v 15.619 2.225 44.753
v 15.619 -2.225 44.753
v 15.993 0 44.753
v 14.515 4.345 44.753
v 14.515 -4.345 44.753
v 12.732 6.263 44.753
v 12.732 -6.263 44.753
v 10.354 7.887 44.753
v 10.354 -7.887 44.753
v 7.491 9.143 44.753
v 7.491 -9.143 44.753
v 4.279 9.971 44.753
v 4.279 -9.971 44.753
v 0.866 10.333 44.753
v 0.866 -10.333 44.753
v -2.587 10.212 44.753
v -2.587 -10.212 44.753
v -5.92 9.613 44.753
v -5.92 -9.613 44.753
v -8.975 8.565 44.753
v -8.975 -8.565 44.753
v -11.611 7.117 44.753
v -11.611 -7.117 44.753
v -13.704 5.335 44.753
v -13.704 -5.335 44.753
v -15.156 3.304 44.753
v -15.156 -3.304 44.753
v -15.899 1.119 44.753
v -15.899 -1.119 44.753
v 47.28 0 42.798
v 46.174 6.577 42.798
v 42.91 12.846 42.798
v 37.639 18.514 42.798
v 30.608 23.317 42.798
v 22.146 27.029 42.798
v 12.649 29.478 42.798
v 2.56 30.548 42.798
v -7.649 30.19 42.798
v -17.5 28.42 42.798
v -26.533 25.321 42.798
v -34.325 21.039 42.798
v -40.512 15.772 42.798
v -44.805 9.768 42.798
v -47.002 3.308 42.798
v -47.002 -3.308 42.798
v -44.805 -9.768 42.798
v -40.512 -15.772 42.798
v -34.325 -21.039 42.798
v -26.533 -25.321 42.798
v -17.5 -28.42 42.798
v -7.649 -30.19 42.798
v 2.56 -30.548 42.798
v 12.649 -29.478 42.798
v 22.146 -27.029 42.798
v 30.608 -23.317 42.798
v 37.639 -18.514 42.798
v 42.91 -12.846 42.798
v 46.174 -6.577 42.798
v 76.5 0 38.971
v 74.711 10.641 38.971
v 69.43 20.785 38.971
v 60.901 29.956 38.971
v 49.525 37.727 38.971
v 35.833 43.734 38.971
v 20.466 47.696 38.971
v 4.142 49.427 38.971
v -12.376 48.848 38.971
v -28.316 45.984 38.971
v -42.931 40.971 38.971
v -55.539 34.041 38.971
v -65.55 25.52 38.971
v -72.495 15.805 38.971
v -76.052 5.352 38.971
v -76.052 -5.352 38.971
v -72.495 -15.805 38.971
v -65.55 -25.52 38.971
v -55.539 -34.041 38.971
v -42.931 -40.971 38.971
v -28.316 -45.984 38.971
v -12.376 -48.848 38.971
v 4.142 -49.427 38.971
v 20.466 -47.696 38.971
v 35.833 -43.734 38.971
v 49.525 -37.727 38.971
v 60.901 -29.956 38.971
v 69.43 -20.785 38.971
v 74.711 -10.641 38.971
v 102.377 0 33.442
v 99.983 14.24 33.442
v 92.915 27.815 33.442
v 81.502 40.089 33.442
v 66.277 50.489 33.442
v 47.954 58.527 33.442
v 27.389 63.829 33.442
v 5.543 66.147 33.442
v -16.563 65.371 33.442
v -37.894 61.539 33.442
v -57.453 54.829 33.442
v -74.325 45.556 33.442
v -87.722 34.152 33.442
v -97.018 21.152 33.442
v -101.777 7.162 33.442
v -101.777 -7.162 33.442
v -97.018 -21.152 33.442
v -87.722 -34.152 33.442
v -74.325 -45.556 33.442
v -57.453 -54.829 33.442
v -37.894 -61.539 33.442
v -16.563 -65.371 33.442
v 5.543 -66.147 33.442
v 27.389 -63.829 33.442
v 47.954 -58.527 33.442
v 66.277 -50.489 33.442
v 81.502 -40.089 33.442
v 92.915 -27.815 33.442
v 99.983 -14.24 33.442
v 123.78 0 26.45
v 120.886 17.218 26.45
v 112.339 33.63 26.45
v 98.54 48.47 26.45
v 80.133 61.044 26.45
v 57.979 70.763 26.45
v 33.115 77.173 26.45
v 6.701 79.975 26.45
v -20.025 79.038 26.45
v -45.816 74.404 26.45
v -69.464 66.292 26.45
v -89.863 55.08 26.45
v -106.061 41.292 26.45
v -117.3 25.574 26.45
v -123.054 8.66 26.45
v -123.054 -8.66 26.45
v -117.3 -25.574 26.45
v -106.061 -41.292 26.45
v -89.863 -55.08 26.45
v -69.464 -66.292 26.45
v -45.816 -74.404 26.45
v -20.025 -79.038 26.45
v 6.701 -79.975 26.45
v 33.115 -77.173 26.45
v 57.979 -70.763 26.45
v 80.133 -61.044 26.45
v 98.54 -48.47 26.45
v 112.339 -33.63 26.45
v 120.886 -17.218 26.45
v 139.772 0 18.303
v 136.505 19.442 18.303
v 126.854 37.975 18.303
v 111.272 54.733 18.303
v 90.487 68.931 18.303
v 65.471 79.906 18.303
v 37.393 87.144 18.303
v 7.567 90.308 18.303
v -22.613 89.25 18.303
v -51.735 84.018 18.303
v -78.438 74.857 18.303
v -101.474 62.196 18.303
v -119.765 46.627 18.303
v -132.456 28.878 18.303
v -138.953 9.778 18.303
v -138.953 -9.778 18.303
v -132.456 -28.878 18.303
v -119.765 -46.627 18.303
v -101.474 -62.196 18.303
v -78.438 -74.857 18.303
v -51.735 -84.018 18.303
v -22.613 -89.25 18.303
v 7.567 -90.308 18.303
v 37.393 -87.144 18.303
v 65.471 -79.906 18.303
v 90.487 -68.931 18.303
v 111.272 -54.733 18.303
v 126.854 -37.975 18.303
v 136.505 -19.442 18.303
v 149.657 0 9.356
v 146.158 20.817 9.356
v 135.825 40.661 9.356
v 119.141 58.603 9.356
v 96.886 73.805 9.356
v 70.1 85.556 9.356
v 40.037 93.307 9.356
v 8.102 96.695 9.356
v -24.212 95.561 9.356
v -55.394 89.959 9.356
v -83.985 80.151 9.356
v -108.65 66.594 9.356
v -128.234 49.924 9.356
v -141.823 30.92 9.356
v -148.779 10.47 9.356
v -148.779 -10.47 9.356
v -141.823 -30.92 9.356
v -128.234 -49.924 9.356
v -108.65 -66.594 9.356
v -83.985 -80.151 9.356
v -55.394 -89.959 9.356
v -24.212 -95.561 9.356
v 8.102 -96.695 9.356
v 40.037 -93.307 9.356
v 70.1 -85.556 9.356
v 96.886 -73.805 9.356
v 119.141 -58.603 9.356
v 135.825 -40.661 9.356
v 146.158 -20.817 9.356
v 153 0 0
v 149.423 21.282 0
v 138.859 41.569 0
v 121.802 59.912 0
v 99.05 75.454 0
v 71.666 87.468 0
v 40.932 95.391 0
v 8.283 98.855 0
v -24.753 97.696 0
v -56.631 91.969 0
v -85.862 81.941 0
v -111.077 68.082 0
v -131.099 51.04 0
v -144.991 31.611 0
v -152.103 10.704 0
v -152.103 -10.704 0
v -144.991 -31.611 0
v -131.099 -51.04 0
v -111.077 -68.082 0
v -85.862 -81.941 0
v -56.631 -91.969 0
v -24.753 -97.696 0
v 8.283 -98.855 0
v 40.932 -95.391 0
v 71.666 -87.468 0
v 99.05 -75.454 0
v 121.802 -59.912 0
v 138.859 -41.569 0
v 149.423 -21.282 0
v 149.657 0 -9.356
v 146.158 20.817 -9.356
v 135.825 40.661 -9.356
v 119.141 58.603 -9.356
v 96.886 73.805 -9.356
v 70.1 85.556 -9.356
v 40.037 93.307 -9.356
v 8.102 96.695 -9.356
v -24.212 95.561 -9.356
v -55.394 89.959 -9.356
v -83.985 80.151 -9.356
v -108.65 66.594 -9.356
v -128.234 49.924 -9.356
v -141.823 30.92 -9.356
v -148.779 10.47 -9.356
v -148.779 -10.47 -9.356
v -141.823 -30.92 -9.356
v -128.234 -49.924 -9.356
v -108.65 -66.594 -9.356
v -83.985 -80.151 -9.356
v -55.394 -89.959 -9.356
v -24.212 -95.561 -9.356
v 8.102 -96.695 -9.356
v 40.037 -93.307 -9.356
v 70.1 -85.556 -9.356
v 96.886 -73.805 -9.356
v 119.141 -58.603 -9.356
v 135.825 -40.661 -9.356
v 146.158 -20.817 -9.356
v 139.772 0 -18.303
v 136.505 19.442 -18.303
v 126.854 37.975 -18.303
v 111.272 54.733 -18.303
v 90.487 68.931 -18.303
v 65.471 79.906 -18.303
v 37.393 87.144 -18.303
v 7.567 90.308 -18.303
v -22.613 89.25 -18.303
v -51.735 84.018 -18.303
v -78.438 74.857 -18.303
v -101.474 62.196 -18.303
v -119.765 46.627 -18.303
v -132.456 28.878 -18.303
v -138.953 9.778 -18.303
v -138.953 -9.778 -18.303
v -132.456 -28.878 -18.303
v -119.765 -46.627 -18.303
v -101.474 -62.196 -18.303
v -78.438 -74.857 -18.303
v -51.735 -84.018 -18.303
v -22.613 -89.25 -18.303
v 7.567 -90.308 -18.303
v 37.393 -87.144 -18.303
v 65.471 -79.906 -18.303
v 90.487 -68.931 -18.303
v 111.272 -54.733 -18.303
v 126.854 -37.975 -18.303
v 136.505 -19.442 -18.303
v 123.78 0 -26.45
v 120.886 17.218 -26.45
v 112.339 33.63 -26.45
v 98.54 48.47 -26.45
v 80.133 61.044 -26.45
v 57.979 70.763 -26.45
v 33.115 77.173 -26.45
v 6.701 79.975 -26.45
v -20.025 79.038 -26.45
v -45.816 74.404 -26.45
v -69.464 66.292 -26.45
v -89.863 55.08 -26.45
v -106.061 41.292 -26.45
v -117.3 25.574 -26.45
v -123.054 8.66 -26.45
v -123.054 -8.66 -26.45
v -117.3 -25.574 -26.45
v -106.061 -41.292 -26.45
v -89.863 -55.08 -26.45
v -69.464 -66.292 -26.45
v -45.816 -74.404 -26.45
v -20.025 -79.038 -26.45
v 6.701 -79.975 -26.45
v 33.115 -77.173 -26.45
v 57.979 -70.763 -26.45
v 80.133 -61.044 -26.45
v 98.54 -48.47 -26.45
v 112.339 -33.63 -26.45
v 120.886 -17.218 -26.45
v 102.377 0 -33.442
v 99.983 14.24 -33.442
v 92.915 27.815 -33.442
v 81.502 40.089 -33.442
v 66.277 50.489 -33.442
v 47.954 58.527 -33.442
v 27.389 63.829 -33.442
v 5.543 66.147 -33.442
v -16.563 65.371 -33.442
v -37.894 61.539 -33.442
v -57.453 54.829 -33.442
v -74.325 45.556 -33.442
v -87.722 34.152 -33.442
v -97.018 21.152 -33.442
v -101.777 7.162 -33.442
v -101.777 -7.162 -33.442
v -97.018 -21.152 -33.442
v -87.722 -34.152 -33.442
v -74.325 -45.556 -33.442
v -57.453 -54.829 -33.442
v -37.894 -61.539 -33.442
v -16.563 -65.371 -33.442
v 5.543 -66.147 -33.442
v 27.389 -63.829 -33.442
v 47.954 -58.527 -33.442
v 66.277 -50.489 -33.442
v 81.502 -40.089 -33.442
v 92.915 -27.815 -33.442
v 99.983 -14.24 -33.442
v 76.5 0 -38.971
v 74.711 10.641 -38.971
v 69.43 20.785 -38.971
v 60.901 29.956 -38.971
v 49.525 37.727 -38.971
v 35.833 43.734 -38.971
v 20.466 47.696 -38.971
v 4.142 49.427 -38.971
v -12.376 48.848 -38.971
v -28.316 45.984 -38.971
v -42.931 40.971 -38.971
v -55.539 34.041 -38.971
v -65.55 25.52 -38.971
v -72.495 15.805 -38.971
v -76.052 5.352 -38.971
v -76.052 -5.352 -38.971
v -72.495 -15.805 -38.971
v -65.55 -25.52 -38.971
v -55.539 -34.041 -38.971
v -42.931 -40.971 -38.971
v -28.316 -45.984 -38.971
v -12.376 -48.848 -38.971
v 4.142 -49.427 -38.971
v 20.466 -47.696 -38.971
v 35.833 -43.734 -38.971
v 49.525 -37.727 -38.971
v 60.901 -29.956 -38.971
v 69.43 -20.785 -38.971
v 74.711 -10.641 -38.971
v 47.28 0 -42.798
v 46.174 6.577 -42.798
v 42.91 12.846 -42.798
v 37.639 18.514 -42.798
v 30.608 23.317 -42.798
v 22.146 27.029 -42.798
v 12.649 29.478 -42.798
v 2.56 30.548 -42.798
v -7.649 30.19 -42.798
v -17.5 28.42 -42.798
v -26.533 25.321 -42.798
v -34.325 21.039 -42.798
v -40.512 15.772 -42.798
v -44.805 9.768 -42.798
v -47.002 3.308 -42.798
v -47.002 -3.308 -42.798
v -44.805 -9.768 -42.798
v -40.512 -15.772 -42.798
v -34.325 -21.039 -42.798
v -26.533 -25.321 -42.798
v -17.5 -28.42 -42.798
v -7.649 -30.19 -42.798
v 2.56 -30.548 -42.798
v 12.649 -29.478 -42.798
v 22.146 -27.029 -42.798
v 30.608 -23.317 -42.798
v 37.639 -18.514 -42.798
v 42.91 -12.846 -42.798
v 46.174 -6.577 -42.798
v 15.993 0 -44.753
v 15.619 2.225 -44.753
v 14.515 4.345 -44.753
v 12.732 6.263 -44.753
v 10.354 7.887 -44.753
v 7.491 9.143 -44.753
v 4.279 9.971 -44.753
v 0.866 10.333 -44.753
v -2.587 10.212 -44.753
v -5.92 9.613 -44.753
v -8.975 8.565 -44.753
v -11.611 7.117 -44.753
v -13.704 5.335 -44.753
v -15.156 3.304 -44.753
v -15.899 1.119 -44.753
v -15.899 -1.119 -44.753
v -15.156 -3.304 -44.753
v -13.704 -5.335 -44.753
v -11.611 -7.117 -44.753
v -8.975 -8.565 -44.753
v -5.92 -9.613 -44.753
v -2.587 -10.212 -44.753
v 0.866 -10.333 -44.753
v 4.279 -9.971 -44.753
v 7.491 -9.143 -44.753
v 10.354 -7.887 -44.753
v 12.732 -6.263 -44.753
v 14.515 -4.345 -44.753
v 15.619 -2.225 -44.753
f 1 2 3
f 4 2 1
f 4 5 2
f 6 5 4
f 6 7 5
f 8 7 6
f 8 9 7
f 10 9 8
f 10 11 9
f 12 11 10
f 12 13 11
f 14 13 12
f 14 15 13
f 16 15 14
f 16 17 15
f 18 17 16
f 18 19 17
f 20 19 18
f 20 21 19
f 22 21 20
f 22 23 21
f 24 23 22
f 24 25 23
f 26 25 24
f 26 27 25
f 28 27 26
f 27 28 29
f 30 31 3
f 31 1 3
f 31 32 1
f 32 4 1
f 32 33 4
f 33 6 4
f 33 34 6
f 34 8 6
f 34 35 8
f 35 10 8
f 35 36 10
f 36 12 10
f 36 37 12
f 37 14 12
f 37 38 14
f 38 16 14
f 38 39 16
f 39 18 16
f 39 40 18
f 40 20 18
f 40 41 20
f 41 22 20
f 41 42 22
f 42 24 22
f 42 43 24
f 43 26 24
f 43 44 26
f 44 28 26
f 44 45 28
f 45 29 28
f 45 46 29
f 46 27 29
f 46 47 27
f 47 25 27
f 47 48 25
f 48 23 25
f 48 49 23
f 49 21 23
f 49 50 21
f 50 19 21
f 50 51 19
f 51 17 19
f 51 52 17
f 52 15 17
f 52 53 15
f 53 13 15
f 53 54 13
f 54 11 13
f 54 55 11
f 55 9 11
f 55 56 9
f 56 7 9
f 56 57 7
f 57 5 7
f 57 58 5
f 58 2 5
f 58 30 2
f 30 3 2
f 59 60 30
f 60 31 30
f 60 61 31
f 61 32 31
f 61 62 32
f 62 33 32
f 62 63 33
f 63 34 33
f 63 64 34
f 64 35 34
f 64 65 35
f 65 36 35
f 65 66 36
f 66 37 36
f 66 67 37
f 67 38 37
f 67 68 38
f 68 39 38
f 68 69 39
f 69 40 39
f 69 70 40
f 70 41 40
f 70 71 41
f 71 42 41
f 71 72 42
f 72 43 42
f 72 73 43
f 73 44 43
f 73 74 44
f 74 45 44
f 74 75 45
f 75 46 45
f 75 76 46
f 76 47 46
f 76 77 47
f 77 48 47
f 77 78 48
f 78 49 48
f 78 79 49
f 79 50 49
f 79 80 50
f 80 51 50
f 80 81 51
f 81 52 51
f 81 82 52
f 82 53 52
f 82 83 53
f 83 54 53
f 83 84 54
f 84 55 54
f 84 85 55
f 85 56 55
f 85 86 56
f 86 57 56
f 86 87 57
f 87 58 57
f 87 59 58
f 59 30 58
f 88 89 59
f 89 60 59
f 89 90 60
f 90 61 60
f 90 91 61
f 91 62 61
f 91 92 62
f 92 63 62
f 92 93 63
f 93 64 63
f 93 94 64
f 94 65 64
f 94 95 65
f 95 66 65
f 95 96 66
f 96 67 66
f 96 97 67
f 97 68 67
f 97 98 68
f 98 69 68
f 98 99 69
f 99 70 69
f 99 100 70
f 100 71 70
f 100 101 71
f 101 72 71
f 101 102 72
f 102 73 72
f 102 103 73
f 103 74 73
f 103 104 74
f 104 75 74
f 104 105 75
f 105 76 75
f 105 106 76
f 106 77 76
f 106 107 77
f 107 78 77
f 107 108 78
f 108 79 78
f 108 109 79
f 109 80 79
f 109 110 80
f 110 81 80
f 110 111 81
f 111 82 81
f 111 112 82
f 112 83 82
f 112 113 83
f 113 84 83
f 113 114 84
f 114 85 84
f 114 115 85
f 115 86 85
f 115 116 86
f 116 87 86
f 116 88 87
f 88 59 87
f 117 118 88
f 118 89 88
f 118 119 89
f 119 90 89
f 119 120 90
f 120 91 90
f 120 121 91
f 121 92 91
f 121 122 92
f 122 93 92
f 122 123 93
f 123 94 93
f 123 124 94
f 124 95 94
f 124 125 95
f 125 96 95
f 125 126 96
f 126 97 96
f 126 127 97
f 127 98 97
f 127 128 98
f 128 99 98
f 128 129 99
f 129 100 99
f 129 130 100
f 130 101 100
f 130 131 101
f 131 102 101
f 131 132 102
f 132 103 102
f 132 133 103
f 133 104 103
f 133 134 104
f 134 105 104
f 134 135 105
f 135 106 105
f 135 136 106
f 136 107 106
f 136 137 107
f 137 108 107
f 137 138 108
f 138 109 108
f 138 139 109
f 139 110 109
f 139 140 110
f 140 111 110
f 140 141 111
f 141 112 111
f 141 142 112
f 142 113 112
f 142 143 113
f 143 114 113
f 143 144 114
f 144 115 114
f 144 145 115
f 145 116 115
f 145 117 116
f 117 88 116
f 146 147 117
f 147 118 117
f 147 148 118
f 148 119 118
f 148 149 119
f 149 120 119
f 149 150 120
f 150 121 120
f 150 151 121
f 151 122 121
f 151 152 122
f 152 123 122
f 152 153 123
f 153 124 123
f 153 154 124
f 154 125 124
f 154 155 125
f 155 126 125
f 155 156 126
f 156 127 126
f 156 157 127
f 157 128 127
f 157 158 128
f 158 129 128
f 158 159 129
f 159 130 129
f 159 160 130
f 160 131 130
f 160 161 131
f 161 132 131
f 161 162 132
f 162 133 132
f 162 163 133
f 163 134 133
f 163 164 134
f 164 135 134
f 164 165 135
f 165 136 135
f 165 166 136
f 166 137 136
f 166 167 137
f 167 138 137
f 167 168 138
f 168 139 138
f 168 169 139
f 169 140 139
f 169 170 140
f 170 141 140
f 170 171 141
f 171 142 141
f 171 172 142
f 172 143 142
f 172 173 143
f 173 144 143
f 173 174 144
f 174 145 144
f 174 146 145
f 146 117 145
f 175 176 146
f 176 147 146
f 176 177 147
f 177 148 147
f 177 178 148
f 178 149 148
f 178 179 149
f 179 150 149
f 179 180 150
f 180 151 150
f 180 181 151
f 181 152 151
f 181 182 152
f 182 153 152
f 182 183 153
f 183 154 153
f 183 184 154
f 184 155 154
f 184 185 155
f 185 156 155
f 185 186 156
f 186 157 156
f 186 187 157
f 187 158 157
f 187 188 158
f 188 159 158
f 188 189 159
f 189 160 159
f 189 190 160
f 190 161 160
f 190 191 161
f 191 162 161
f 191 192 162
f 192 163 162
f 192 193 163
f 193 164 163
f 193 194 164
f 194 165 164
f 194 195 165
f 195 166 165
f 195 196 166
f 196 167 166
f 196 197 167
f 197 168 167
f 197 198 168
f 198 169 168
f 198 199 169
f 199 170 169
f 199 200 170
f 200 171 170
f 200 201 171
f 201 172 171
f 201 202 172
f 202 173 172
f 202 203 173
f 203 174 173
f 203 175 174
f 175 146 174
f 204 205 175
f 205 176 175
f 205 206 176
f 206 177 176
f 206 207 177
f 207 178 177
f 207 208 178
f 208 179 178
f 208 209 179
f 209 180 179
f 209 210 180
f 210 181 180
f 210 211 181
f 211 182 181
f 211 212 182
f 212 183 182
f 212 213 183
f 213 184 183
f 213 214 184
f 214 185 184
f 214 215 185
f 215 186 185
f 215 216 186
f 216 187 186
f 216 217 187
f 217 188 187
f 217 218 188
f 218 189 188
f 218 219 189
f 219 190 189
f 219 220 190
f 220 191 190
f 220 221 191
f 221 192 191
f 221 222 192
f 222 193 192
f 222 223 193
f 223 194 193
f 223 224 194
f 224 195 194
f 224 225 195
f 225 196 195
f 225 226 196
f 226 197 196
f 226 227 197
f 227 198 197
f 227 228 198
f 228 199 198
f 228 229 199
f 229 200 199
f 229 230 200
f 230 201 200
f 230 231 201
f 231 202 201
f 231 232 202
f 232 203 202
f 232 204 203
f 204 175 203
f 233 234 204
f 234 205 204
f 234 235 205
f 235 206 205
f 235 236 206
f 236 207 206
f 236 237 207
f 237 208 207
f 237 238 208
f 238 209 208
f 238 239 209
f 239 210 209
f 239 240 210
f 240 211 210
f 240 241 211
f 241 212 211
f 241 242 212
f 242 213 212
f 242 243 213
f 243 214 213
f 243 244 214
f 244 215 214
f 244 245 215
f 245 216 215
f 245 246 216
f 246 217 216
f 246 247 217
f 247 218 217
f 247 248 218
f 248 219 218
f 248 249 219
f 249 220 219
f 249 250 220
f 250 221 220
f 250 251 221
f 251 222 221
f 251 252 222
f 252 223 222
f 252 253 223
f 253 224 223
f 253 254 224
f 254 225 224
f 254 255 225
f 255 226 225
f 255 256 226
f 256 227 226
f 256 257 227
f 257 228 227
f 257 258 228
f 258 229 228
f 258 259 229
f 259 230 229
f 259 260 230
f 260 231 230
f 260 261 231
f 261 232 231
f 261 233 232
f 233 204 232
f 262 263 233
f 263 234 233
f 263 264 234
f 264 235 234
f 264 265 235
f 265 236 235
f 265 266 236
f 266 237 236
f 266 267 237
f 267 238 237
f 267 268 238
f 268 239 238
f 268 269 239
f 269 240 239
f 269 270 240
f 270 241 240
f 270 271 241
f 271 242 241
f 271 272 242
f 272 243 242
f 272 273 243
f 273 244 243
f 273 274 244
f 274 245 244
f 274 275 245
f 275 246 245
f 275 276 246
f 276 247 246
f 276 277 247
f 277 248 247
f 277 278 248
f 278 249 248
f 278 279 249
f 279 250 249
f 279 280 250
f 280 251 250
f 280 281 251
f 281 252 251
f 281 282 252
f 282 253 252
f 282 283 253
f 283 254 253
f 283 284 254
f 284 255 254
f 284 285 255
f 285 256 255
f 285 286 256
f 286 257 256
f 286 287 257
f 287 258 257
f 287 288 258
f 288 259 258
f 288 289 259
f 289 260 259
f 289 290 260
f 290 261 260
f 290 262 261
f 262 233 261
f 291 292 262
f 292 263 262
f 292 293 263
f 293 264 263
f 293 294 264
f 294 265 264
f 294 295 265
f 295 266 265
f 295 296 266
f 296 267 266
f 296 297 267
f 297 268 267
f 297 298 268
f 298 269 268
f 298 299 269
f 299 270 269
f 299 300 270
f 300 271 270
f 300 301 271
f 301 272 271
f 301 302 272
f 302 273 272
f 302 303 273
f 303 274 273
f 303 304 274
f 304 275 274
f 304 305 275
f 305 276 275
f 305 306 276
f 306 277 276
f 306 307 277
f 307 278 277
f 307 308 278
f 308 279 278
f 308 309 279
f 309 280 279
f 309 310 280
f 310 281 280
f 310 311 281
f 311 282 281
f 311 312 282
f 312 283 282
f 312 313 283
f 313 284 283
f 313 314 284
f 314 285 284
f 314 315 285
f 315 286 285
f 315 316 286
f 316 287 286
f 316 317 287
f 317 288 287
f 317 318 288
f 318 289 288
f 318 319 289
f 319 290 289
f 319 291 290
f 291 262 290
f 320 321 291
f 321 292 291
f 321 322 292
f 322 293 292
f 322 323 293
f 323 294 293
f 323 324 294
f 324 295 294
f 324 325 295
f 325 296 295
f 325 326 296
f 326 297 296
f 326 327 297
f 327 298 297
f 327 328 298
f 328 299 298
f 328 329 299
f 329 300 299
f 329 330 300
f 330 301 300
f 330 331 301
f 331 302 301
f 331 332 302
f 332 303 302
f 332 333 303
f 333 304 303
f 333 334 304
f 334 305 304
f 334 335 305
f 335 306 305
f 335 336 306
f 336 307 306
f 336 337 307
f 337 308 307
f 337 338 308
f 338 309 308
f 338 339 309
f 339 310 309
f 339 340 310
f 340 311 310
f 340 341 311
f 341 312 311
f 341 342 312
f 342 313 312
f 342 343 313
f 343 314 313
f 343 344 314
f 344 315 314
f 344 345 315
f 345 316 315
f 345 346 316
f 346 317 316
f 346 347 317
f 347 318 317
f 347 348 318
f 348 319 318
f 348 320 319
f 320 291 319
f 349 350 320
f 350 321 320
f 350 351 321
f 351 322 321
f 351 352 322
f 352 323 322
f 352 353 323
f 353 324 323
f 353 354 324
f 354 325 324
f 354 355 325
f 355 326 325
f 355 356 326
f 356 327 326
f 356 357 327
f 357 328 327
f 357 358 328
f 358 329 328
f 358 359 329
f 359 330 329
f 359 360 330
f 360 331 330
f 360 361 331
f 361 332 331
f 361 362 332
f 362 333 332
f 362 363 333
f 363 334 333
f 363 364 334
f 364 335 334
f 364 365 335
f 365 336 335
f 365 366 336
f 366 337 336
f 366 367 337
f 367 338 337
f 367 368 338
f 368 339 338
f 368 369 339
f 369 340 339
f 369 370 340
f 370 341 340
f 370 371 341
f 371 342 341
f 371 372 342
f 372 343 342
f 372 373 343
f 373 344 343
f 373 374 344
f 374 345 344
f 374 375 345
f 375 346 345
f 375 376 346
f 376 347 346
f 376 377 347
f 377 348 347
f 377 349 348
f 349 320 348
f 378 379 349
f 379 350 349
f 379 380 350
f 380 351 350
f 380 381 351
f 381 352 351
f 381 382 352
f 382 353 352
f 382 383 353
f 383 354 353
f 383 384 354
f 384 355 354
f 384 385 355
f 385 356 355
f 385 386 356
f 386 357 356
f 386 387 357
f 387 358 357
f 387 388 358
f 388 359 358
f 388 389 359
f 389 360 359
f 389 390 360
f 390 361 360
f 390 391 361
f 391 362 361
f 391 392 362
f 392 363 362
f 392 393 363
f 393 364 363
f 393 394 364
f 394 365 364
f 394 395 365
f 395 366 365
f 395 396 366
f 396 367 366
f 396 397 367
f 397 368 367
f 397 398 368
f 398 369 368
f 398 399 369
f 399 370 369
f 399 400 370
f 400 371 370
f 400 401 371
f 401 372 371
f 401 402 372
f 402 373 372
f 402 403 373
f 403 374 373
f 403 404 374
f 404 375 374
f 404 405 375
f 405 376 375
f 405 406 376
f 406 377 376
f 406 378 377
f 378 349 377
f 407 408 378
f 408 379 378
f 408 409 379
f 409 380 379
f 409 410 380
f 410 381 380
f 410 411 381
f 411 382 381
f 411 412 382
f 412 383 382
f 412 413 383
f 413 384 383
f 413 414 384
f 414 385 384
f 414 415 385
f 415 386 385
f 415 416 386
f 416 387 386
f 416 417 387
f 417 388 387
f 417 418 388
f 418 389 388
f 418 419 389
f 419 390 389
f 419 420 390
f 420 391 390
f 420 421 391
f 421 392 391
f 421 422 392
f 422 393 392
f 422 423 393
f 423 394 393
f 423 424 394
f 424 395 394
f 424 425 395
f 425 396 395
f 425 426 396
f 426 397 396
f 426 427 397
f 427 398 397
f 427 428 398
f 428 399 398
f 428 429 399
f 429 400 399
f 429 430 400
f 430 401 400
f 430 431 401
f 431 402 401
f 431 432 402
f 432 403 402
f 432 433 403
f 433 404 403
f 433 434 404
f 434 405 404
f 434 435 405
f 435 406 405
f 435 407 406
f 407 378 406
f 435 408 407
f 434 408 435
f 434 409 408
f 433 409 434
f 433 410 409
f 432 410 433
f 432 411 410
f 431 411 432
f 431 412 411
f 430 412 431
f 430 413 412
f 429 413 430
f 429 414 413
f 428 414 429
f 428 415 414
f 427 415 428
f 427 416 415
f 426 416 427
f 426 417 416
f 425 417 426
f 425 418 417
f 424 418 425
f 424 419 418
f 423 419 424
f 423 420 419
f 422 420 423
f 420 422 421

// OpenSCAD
// Generated by SolidPython 1.0.1 on 2020-07-29 00:46:53


scale(v = [17, 11, 5]) {
	sphere(r = 9);
}
/***********************************************
*********      SolidPython code:      **********
************************************************
 
# import packages: SolidPython
from solid import *
from solid.utils import *
from itertools import chain, combinations, permutations


class Resize:

    def __init__(self, scad_file):
        self.scad_file = scad_file
        #self.scad_file = import_scad(scad_file)
        # cone/cylinder param:
        self.r1 = 0
        self.r2 = 0
        self.h = 0
        # rectangular prism param:
        self.w = 0
        self.l = 0
        # ellipse param:
        self.r = 0

    # import OpenScad code (file name corresponds to shape)


    # classify shape + parameters
    def assign(self, param1, param2, param3):
        if self.scad_file == 'cone.scad':
            self.r1 = param1
            self.r2 = param2
            self.h = param3
        elif self.scad_file == 'cylinder.scad':
            self.r1 = param1
            self.r2 = param2
            self.h = param3
        elif self.scad_file == 'rectangularPrism.scad':
            self.h = param1
            self.l = param2
            self.w = param3
        else:
            self.r = param1
            self.h = param2

    # resize parameters
    def iterate(self):
        x = range(3, 20, 2)
        i = 1
        if self.scad_file == 'cone.scad':
            tempList = list(permutations(x, 2))
            for temp in tempList:
                param1 = temp[0]
                param2 = temp[1]
                filepath = 'produced_scad_files/' + 'cone' + str(param1) + '_' + str(param2) + '_' + '.scad'
                scad_render_to_file(cylinder(h=param1, r1=param2, r2=0), filepath)

        elif self.scad_file == 'cylinder.scad':
            tempList = list(permutations(x, 3))
            for temp in tempList:
                param1 = temp[0]
                param2 = temp[1]
                filepath = 'produced_scad_files/' + 'cylinder' + str(param1) + '_' + str(param2) + '_' + '.scad'
                scad_render_to_file(cylinder(h=param1, r1=param2, r2=param2), filepath)

        elif self.scad_file == 'rectangularPrism.scad':
            tempList = list(permutations(x, 3))
            for temp in tempList:
                param1 = temp[0]
                param2 = temp[1]
                param3 = temp[2]
                filepath = 'produced_scad_files/' + 'rectangularPrism' + str(param1) + '_' + str(param2) + '_' + str(
                    param3) + '.scad'
                scad_render_to_file(cube(size=(param1, param2, param3)), filepath)

        elif self.scad_file == 'ellipse.scad':
            tempList = list(permutations(x, 4))
            for temp in tempList:
                param1 = temp[0]
                param2 = temp[1]
                param3 = temp[2]
                param4 = temp[3]
                filepath = 'produced_scad_files/' + 'ellipse' + str(param1) + '_' + str(param2) + '_' + str(param3) + '_' + str(param4) + '.scad'
                scad_render_to_file(scale([param1, param2, param3])(sphere(r=param4)), filepath)

    def render_to_scadfile(self):
        scad_render_to_file(scad, 'example.scad') 
 
************************************************/
